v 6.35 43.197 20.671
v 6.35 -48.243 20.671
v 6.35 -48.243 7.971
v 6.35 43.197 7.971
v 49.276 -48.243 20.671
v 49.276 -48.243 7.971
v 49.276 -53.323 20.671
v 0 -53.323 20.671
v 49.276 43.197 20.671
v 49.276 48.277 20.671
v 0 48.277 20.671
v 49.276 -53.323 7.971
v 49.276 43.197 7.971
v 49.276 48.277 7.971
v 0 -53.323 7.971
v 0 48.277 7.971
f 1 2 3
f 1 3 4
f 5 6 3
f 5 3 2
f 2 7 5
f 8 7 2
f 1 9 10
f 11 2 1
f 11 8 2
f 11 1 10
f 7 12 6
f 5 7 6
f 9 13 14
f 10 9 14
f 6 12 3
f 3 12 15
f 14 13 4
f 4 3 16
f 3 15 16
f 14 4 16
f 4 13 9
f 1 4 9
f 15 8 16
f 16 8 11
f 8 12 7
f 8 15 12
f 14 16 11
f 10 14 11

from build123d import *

# Parameters (mm, degrees)
F5_W     = 101.6
F5_H     = 12.7
F6_DEPTH = 6.35
F7_W     = 5.08
F7_H     = 12.7
F8_DEPTH = 42.926


# Not quite as in the source:
# - a feature of the source that left no trace in its solid (it failed there, or was rolled back) is left out


with BuildPart() as f6:
    # F5 (on Right) → F6 (new body)
    with BuildSketch(Plane.YZ):
        with Locations((-2.5232887447, 14.3209207639)):
            Rectangle(F5_W, F5_H)
    extrude(amount=F6_DEPTH)

    # F7 (on face) → F8 (join)
    with BuildSketch(Plane.YZ.offset(6.35)):
        with Locations((-50.7832887447, 14.3209207639)):
            Rectangle(F7_W, F7_H)
        with Locations((45.7367112553, 14.3209207639)):
            Rectangle(F7_W, F7_H)
    extrude(amount=F8_DEPTH)


solid = f6.part
